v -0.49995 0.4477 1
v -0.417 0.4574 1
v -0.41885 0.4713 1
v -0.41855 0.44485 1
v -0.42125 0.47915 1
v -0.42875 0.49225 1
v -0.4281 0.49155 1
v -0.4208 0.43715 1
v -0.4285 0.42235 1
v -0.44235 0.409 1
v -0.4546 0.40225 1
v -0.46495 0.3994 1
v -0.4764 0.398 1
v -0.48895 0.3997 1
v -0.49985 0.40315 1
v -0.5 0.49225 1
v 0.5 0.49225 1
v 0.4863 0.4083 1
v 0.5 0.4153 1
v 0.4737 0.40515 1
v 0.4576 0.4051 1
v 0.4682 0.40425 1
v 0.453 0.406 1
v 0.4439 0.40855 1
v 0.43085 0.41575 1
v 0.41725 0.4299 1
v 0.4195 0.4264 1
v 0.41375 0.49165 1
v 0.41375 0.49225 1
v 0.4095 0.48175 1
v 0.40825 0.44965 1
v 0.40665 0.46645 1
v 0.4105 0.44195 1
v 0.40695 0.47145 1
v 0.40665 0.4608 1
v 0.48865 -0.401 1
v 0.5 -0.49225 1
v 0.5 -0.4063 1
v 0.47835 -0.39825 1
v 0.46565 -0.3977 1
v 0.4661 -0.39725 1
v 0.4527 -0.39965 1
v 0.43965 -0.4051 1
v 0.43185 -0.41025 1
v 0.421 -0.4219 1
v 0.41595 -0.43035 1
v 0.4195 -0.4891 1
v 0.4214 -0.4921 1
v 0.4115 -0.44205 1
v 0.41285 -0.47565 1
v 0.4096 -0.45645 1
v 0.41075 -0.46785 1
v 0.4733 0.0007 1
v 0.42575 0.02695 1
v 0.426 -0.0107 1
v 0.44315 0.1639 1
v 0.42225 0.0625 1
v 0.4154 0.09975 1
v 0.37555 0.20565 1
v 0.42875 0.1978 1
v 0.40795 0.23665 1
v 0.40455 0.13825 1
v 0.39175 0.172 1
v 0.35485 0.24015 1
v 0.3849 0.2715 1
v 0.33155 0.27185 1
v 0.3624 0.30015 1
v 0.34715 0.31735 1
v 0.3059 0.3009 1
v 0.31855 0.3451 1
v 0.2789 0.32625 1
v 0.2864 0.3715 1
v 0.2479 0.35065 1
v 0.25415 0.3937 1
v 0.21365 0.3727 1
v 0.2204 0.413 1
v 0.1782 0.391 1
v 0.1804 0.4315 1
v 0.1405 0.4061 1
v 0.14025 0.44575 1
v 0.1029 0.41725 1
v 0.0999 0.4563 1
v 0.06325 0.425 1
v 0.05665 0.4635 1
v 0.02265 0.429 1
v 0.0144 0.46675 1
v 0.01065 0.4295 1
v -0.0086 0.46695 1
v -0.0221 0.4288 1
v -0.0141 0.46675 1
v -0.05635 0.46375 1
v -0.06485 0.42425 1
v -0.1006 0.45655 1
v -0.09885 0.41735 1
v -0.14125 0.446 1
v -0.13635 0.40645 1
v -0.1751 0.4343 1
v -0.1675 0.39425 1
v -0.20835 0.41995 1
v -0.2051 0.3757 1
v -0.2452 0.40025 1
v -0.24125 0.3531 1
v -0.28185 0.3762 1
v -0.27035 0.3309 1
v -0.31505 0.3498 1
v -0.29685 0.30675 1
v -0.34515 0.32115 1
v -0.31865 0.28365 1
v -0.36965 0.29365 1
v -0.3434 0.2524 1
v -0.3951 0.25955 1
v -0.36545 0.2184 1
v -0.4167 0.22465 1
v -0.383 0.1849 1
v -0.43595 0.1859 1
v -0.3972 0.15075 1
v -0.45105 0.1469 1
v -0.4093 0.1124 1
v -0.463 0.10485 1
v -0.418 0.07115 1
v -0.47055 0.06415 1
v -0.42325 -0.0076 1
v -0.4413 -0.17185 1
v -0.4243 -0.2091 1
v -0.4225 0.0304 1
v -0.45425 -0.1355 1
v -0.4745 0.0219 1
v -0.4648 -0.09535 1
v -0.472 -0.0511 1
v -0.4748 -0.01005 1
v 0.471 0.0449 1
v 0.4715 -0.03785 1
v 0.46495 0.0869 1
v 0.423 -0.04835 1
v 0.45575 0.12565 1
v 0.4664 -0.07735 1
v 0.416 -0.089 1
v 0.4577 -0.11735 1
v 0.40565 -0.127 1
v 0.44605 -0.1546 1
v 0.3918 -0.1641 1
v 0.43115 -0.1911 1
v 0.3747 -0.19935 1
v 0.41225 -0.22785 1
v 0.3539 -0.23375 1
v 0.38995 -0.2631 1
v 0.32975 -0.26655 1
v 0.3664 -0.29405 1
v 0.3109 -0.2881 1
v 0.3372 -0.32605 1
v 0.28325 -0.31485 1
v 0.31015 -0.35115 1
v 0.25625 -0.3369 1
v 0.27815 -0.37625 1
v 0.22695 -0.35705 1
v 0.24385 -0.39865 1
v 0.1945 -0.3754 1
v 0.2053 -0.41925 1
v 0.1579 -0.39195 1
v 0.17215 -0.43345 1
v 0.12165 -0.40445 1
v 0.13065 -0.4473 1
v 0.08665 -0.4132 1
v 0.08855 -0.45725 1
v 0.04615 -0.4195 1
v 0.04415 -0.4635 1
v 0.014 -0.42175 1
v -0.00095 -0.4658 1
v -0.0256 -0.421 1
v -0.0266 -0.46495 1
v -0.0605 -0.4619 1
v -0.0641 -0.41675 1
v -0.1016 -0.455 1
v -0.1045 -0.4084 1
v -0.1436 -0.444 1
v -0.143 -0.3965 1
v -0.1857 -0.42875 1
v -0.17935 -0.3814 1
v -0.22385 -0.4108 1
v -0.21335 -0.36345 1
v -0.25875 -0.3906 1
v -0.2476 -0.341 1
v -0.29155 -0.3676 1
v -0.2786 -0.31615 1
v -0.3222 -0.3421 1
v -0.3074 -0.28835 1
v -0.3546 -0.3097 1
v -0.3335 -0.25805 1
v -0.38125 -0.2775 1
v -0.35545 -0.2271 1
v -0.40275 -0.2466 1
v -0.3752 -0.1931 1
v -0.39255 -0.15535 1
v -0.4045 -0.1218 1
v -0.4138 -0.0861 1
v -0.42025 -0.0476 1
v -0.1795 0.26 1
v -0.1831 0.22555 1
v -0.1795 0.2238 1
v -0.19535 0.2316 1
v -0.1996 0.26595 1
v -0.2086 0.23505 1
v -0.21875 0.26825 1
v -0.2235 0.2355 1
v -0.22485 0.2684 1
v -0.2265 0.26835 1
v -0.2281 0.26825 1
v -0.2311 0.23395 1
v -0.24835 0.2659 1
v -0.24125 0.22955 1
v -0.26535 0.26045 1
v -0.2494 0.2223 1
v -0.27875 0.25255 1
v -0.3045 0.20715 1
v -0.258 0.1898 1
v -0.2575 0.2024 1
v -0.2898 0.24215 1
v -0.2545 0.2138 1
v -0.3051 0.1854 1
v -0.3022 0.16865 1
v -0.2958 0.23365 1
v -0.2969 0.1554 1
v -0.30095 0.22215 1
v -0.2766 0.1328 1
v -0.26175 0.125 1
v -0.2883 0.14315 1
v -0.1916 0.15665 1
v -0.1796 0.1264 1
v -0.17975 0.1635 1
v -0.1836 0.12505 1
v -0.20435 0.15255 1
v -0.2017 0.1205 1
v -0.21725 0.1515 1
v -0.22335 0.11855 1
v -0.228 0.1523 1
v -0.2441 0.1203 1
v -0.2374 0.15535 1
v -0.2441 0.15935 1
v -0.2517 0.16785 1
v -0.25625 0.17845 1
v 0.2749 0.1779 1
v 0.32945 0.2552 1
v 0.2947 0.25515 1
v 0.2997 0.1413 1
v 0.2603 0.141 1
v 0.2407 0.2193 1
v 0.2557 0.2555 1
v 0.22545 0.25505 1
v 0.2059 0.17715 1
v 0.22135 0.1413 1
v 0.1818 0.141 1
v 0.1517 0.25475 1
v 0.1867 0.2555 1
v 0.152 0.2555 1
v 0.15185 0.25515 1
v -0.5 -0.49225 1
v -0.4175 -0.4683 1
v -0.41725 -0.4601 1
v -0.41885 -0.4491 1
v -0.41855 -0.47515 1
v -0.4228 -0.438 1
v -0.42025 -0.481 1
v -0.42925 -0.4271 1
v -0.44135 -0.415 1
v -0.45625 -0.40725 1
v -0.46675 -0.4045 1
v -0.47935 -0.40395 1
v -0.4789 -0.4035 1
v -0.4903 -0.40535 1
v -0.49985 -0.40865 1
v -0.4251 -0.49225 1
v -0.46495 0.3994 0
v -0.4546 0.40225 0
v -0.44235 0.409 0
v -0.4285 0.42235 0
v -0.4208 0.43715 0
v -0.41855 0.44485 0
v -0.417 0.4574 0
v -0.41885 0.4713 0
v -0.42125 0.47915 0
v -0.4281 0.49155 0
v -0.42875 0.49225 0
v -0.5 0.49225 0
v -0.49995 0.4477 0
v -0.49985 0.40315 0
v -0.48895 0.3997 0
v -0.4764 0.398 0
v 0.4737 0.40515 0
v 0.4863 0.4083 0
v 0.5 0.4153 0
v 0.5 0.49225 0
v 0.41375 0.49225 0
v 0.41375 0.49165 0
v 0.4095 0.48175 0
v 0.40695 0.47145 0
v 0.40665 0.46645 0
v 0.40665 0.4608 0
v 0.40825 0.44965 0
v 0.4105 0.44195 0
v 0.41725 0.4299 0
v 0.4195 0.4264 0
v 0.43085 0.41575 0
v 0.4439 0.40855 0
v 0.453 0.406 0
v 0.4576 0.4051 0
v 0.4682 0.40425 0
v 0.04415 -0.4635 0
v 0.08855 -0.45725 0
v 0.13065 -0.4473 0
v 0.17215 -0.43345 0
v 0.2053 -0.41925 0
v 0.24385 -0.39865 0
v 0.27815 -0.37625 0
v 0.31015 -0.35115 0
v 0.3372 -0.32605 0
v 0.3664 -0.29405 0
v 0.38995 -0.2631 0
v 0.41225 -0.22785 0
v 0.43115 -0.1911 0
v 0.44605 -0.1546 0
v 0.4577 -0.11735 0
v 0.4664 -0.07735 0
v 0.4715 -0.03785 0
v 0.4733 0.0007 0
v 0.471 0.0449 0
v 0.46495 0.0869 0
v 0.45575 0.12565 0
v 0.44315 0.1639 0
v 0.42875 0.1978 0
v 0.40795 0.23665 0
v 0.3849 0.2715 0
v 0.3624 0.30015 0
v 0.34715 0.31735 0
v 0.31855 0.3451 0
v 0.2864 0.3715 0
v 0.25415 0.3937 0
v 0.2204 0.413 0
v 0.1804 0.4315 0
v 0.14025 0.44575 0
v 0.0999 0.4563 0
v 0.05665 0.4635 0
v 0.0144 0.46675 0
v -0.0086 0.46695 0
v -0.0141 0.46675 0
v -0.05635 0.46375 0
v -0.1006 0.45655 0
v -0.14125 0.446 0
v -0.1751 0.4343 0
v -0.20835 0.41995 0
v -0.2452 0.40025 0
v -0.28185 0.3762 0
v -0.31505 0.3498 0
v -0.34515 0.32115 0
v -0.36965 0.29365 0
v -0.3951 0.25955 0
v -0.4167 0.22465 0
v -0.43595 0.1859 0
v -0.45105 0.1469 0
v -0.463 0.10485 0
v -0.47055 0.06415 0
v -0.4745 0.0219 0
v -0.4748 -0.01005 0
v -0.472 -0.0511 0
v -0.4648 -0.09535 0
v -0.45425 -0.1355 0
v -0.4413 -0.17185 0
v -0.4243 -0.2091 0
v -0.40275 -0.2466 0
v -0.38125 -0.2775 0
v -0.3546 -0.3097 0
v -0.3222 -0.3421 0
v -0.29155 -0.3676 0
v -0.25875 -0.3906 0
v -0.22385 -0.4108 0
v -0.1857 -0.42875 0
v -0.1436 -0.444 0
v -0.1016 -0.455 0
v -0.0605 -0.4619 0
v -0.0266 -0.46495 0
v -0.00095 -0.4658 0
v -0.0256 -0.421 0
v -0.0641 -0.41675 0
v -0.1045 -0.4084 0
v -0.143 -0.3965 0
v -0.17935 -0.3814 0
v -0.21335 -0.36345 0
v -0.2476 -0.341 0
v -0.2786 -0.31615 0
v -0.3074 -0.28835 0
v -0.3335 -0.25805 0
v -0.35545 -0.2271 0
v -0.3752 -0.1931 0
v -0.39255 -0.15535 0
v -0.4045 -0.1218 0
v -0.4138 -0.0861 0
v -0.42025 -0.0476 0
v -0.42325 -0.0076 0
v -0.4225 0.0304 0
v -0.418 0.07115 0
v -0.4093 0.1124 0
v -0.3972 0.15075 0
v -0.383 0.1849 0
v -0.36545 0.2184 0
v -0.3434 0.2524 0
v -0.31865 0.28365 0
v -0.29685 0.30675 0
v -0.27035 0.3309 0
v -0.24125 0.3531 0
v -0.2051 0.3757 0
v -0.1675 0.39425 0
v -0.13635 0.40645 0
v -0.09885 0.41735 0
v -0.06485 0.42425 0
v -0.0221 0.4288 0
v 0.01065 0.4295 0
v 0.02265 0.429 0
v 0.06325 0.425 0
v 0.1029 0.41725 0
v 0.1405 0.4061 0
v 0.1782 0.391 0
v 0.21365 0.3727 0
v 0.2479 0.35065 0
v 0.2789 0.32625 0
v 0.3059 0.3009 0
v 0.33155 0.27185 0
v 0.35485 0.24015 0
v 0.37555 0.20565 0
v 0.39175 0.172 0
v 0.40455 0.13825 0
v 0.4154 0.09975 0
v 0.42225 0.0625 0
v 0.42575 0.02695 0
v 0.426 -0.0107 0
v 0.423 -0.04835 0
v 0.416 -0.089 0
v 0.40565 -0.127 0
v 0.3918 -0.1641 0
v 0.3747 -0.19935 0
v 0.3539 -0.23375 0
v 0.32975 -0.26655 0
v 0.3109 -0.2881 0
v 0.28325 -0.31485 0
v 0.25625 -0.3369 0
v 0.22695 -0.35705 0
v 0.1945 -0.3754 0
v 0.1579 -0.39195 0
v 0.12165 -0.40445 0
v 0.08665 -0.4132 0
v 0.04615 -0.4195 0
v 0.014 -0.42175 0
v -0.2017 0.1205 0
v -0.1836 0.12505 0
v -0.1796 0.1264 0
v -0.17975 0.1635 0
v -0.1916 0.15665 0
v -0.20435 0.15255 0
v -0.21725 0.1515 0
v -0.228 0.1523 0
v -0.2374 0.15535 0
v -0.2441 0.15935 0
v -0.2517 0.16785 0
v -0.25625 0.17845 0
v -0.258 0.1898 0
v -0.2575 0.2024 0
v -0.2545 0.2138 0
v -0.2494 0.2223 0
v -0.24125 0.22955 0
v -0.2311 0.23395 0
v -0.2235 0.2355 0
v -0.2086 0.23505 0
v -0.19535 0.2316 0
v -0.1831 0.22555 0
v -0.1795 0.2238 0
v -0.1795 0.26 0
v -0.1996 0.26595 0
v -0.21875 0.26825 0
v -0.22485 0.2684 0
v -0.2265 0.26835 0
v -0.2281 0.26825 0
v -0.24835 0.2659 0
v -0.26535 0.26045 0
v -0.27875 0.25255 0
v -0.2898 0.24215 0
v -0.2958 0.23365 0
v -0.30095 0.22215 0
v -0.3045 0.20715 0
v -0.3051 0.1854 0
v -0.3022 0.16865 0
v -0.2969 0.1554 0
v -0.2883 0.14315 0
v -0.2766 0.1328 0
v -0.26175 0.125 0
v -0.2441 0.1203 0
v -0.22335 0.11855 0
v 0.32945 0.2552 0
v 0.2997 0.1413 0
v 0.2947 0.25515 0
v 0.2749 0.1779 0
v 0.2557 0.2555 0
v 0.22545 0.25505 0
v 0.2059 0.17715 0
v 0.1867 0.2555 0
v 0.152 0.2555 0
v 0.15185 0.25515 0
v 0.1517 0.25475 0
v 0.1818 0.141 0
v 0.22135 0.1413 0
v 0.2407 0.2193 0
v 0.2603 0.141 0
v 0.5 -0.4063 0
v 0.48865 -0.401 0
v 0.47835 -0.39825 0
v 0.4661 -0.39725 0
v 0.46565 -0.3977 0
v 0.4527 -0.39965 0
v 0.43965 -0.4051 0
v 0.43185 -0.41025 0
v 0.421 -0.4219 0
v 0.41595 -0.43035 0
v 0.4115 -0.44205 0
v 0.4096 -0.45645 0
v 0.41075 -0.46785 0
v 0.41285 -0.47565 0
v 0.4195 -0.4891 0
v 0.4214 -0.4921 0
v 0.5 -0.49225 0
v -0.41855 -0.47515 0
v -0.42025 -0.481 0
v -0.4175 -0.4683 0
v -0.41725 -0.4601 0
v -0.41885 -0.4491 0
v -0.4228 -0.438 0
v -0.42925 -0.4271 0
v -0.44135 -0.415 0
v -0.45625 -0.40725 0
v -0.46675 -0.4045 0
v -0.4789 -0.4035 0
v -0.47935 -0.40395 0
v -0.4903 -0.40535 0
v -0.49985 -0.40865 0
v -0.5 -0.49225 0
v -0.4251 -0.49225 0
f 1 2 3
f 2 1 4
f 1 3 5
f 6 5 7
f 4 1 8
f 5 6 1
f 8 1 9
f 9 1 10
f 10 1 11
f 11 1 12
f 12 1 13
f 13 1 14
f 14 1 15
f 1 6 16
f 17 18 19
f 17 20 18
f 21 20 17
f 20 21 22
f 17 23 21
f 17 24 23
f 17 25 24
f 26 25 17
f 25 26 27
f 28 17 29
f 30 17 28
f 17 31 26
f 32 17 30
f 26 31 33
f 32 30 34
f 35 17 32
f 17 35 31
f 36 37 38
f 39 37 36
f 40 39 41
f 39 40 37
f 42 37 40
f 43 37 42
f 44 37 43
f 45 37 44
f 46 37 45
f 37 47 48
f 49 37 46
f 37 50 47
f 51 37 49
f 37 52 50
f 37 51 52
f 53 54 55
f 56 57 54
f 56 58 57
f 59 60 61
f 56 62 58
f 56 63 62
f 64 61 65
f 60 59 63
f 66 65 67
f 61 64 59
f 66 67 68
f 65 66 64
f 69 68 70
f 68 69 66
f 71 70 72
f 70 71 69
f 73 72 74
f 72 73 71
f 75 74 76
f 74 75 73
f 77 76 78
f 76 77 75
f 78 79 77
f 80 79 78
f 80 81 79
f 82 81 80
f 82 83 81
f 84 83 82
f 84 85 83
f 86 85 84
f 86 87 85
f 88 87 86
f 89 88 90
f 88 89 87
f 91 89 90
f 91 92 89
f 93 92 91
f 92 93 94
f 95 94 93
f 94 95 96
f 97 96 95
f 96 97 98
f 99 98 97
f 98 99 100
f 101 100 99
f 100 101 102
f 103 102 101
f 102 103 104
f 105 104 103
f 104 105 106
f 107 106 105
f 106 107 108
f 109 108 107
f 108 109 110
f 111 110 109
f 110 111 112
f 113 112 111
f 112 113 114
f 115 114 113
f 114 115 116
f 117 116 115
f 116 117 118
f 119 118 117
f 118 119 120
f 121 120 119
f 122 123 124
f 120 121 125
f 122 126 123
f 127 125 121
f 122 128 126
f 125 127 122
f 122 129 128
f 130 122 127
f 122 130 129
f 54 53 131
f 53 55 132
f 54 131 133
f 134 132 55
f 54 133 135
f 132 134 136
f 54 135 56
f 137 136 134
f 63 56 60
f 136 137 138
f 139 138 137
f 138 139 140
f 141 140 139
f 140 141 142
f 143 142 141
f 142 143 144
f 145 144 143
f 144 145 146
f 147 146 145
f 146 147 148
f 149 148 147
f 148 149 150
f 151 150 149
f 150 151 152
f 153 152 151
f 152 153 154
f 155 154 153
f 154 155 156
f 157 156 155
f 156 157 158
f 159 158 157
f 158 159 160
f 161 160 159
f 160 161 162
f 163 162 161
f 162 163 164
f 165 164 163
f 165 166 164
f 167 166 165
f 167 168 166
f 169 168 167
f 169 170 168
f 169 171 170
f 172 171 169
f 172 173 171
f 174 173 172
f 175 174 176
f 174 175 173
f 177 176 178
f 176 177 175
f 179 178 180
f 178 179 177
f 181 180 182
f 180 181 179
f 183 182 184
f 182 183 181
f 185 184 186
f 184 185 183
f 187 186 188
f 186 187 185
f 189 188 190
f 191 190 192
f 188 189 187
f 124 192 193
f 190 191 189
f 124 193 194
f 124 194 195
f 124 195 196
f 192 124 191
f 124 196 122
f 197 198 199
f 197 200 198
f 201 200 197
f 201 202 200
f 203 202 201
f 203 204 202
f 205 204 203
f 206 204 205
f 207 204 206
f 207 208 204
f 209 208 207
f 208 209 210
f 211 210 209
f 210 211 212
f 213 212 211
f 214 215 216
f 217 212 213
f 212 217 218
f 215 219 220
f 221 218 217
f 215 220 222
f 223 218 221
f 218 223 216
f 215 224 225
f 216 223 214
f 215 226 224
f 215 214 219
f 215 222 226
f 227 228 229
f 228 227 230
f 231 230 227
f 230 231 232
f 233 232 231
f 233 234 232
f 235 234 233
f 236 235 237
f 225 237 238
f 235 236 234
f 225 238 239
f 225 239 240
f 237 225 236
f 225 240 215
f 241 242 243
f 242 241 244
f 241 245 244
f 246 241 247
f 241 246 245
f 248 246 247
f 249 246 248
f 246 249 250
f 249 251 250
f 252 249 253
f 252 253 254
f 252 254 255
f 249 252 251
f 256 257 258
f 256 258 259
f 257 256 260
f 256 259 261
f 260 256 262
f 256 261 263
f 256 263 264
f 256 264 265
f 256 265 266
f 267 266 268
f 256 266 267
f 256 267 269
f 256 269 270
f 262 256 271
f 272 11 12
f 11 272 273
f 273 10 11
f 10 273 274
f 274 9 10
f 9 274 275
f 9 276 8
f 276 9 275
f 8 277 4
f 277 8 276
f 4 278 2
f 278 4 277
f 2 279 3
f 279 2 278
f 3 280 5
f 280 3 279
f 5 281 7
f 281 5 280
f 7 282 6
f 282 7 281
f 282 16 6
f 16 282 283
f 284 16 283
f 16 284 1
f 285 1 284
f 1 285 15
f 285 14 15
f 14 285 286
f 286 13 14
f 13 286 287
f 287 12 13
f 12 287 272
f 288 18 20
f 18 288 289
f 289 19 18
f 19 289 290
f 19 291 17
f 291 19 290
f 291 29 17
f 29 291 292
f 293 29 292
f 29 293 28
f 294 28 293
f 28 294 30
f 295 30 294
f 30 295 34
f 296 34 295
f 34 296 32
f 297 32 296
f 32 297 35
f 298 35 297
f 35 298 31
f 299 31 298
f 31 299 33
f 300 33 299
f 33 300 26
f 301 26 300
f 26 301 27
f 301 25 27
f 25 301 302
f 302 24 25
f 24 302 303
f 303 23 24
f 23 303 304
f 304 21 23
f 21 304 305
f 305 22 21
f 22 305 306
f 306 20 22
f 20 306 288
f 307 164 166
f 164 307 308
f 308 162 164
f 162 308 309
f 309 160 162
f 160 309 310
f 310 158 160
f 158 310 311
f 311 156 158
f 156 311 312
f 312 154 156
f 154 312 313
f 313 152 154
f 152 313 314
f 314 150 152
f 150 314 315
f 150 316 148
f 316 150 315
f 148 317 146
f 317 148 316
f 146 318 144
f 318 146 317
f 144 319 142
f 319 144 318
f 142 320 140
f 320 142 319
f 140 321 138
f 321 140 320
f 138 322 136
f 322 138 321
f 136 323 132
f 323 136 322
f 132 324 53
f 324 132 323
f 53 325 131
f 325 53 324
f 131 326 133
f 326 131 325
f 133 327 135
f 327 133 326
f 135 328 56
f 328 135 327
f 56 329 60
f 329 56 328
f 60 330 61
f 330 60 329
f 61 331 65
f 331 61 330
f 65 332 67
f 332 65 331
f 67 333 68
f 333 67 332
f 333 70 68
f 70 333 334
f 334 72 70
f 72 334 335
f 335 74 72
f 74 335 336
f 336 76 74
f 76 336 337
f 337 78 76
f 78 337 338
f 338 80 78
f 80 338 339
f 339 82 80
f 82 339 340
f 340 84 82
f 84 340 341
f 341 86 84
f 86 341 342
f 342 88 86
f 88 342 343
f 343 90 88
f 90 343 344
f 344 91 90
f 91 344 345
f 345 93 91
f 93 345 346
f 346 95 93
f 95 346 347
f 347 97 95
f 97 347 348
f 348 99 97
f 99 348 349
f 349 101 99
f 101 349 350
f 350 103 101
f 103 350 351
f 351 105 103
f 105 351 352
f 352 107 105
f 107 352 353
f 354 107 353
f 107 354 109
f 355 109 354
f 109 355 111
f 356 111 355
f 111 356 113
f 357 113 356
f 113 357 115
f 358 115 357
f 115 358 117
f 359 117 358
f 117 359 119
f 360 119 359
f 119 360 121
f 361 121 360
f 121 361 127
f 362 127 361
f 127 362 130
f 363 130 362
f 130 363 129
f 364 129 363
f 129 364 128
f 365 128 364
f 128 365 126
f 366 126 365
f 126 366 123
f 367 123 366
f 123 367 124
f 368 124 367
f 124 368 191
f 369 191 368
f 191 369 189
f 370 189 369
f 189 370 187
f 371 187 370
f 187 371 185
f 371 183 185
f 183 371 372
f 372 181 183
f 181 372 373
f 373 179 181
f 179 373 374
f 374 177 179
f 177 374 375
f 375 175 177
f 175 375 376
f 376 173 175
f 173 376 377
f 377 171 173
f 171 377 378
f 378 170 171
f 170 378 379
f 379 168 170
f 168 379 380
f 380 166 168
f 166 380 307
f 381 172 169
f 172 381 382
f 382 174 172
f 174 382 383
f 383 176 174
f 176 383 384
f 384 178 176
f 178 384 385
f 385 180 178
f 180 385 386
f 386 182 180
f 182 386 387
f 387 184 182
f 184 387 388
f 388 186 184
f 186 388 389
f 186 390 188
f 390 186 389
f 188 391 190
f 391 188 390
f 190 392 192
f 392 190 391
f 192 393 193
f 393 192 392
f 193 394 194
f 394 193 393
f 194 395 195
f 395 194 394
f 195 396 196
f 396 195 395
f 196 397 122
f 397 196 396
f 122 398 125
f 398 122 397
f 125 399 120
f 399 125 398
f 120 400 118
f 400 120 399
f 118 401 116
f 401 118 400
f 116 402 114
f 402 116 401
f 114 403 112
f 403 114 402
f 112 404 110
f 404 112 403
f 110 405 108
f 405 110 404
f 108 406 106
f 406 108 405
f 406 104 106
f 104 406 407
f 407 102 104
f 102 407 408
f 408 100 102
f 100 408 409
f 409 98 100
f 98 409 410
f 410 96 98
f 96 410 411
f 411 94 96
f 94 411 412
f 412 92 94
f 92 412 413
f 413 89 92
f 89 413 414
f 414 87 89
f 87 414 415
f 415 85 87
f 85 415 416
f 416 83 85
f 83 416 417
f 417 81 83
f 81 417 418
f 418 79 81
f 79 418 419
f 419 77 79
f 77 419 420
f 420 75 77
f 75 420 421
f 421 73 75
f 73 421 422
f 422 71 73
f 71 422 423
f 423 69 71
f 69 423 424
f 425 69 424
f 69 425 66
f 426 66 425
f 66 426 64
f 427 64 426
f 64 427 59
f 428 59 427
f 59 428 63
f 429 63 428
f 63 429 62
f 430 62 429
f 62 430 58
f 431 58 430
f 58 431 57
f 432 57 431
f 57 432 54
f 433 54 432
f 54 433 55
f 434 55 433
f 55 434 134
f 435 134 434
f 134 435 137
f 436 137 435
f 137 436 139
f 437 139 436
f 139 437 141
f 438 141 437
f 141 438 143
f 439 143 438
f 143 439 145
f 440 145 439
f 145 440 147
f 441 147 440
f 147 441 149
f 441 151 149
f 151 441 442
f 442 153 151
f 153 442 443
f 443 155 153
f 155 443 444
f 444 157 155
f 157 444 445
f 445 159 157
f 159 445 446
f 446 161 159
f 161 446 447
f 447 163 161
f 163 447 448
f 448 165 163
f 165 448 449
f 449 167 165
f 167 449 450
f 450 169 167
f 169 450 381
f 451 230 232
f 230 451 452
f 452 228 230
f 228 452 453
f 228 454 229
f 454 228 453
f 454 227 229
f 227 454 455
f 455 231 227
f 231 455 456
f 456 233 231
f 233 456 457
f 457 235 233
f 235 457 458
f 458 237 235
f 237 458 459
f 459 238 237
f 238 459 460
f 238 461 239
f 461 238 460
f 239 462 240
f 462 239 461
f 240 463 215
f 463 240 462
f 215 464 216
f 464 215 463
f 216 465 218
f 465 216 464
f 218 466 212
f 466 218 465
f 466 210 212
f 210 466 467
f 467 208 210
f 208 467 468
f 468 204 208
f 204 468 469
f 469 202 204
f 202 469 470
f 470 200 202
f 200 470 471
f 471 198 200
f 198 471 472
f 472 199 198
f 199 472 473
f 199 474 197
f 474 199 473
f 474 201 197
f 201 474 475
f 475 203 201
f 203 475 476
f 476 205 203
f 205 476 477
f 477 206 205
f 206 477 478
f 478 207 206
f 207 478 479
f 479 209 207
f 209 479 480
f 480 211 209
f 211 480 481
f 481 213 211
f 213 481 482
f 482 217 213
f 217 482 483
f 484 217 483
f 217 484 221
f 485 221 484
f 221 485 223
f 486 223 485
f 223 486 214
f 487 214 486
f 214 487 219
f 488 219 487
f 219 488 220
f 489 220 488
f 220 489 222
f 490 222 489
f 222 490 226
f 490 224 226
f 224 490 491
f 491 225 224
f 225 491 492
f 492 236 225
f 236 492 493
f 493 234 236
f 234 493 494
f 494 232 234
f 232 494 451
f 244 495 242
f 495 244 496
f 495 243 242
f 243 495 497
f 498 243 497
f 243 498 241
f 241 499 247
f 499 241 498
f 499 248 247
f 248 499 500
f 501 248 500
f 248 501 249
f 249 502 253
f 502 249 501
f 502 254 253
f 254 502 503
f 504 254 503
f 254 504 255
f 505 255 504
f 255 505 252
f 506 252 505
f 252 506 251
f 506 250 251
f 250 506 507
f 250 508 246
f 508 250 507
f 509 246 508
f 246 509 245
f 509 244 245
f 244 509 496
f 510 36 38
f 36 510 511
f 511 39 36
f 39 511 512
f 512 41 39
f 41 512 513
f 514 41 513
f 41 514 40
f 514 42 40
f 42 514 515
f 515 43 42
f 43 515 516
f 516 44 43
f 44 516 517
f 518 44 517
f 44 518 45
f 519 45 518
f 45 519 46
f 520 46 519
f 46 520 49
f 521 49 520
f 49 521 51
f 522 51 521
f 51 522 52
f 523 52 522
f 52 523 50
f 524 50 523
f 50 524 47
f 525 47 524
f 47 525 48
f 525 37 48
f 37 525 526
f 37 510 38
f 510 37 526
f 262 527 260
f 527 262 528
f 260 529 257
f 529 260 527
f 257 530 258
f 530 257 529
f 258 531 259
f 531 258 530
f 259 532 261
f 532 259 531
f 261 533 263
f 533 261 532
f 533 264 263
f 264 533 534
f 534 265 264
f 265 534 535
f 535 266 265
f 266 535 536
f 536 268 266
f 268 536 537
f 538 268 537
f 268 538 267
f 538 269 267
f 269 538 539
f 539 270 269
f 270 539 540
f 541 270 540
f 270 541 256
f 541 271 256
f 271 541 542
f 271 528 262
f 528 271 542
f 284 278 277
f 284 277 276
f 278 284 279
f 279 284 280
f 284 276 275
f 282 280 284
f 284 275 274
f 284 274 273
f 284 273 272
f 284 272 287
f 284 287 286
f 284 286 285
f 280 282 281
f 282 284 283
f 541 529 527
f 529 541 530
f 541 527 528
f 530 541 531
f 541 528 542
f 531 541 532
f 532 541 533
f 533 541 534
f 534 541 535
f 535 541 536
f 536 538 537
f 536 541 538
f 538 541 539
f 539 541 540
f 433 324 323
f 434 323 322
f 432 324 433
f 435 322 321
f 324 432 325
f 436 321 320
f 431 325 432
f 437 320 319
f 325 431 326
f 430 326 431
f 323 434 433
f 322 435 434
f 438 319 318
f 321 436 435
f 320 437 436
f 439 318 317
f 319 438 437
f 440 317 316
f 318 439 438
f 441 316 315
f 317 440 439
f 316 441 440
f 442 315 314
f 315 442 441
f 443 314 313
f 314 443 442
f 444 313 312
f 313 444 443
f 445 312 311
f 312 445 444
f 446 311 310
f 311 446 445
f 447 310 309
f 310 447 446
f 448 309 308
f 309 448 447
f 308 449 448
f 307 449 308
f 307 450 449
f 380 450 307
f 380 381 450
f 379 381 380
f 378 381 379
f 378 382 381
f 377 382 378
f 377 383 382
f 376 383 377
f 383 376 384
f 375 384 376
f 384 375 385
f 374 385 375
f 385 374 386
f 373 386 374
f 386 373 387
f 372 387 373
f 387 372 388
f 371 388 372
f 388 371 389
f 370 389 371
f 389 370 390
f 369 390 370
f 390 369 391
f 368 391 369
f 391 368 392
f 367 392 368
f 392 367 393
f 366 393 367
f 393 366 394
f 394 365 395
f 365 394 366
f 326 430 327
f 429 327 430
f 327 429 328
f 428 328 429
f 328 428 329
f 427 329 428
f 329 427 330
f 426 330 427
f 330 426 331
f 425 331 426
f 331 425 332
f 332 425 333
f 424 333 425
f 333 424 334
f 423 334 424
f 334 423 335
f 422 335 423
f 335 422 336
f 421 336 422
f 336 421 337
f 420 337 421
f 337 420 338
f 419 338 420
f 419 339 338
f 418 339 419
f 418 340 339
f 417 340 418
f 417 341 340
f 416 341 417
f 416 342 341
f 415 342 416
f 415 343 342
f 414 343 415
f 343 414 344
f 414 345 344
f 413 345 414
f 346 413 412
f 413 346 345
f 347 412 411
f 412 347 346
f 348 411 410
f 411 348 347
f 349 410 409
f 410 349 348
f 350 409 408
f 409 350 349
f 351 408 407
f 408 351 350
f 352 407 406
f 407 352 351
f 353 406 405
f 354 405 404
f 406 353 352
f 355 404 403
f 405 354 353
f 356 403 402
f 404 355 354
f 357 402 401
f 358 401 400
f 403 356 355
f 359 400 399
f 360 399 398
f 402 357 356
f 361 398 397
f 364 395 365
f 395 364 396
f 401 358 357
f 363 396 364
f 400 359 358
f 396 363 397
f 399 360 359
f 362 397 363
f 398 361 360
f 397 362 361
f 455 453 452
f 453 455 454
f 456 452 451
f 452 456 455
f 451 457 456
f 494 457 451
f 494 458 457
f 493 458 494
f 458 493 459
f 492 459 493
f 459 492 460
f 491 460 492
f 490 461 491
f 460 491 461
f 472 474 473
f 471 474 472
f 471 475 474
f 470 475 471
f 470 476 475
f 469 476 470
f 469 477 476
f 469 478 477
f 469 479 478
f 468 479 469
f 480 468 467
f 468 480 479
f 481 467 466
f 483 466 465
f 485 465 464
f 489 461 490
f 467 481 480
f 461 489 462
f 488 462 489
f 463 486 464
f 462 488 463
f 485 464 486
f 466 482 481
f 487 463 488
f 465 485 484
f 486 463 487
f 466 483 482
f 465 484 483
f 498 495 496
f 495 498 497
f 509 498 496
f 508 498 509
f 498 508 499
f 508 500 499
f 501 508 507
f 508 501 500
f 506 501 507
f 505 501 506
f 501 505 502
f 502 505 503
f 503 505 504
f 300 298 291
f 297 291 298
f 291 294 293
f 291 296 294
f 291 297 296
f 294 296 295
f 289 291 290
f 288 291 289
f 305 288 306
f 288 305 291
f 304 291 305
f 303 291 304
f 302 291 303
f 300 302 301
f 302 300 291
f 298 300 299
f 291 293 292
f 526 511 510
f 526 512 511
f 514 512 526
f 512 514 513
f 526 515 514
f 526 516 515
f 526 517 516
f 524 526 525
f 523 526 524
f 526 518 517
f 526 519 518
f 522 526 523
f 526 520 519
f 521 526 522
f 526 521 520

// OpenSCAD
module C2white2_1()
{
 /* Generated by trace2scad version 20150415
    http://aggregate.org/MAKE/TRACE2SCAD/
    Optimized model has 276/2770 original points
 */
 color([0.5, 0.5, 0.5])
 assign(minx=0) /* polygon minx=0 */
 assign(miny=0) /* polygon miny=0 */
 assign(maxx=20000) /* polygon maxx=20000 */
 assign(maxy=19690) /* polygon maxy=19690 */
 assign(dx=maxx-minx)
 assign(dy=maxy-miny)
 assign(maxd=((dx>dy)?dx:dy))
 scale([1/maxd, 1/maxd, 1])
 translate([-minx-dx/2, -miny-dy/2, 0])
 linear_extrude(height=1, convexity=276)
 union() {
  union() {
   polygon([[1,18799],[3,17908],[221,17839],[472,17805],[701,17833],[908,17890],[1153,18025],[1430,18292],[1584,18588],[1629,18742],[1660,18993],[1623,19271],[1575,19428],[1438,19676],[1425,19690],[0,19690]], convexity=5);
   polygon([[18275,19684],[18275,19678],[18190,19480],[18139,19274],[18133,19174],[18133,19061],[18165,18838],[18210,18684],[18345,18443],[18390,18373],[18617,18160],[18878,18016],[19060,17965],[19152,17947],[19364,17930],[19474,17948],[19726,18011],[20000,18151],[20000,19690],[18275,19690]], convexity=7);
   union() {
    difference() {
     polygon([[9773,19182],[9718,19180],[8873,19120],[7988,18976],[7175,18765],[6498,18531],[5833,18244],[5096,17850],[4363,17369],[3699,16841],[3097,16268],[2607,15718],[2098,15036],[1666,14338],[1281,13563],[979,12783],[740,11942],[589,11128],[510,10283],[504,9644],[560,8823],[704,7938],[915,7135],[1174,6408],[1514,5663],[1945,4913],[2375,4295],[2908,3651],[3556,3003],[4169,2493],[4825,2033],[5523,1629],[6286,1270],[7128,965],[7968,745],[8790,607],[9468,546],[9981,529],[10883,575],[11771,700],[12613,899],[13443,1176],[14106,1460],[14877,1872],[15563,2320],[16203,2822],[16744,3324],[17328,3964],[17799,4583],[18245,5288],[18623,6023],[18921,6753],[19154,7498],[19328,8298],[19430,9088],[19466,9859],[19420,10743],[19299,11583],[19115,12358],[18863,13123],[18575,13801],[18159,14578],[17698,15275],[17248,15848],[16943,16192],[16371,16747],[15728,17275],[15083,17719],[14408,18105],[13608,18475],[12805,18760],[11998,18971],[11133,19115],[10288,19180],[9828,19184]], convexity=6);
     polygon([[10333,18430],[10453,18425],[11265,18345],[12058,18190],[12810,17967],[13564,17665],[14273,17299],[14958,16858],[15578,16370],[16118,15863],[16631,15282],[17097,14648],[17511,13958],[17835,13285],[18091,12610],[18308,11840],[18445,11095],[18515,10384],[18520,9631],[18460,8878],[18320,8065],[18113,7305],[17836,6563],[17494,5858],[17078,5170],[16595,4514],[16218,4083],[15665,3548],[15125,3107],[14539,2704],[13890,2337],[13158,2006],[12433,1756],[11733,1581],[10923,1455],[10280,1410],[9488,1425],[8718,1510],[7910,1677],[7140,1915],[6413,2217],[5733,2576],[5048,3025],[4428,3522],[3852,4078],[3330,4684],[2891,5303],[2496,5983],[2149,6738],[1910,7409],[1724,8123],[1595,8893],[1535,9693],[1550,10453],[1640,11268],[1814,12093],[2056,12860],[2340,13543],[2691,14213],[3132,14893],[3627,15518],[4063,15980],[4593,16463],[5175,16907],[5898,17359],[6650,17730],[7273,17974],[8023,18192],[8703,18330],[9558,18421],[10213,18435]], convexity=6);
    }
    polygon([[5470,15212],[5438,15210],[5033,15163],[4693,15054],[4425,14896],[4204,14688],[4084,14518],[3981,14288],[3910,13988],[3898,13553],[3956,13218],[4062,12953],[4234,12708],[4468,12501],[4765,12345],[5118,12251],[5533,12216],[5966,12255],[6328,12346],[6408,12373],[6405,13115],[6168,12978],[5913,12896],[5655,12875],[5440,12891],[5252,12952],[5118,13032],[4966,13202],[4875,13414],[4840,13641],[4850,13893],[4910,14121],[5012,14291],[5175,14436],[5378,14524],[5530,14555],[5828,14546],[6093,14477],[6338,14356],[6410,14321],[6410,15045],[6008,15164],[5625,15210],[5503,15213]], convexity=12);
    polygon([[13037,14948],[13034,14940],[13636,12665],[14427,12671],[14814,14231],[15206,12665],[15994,12671],[16589,14949],[15894,14948],[15498,13403],[15114,14955],[14509,14946],[14118,13388],[13734,14955],[13040,14955]], convexity=11);
   }
   polygon([[19317,1895],[19313,1891],[19054,1852],[18793,1743],[18637,1640],[18420,1407],[18319,1238],[18230,1004],[18192,716],[18215,488],[18257,332],[18390,63],[18428,3],[20000,0],[20000,1719],[19773,1825],[19567,1880],[19322,1900]], convexity=6);
   polygon([[417,1770],[413,1766],[194,1738],[3,1672],[0,0],[1498,0],[1595,225],[1629,342],[1650,479],[1655,643],[1623,863],[1544,1085],[1415,1303],[1173,1545],[875,1700],[665,1755],[422,1775]], convexity=5);
  }
 }
}

module C2white2()
{
 /* all layers combined, scaled to within a 1mm cube */
 scale([1, 1, 1/1])
 difference() {
  union() {
   scale([1,1,2]) translate([0,0,-0.5]) C2white2_1();
  }
  translate([0,0,-2]) cube([2,2,4],center=true);
 }
}
C2white2();
